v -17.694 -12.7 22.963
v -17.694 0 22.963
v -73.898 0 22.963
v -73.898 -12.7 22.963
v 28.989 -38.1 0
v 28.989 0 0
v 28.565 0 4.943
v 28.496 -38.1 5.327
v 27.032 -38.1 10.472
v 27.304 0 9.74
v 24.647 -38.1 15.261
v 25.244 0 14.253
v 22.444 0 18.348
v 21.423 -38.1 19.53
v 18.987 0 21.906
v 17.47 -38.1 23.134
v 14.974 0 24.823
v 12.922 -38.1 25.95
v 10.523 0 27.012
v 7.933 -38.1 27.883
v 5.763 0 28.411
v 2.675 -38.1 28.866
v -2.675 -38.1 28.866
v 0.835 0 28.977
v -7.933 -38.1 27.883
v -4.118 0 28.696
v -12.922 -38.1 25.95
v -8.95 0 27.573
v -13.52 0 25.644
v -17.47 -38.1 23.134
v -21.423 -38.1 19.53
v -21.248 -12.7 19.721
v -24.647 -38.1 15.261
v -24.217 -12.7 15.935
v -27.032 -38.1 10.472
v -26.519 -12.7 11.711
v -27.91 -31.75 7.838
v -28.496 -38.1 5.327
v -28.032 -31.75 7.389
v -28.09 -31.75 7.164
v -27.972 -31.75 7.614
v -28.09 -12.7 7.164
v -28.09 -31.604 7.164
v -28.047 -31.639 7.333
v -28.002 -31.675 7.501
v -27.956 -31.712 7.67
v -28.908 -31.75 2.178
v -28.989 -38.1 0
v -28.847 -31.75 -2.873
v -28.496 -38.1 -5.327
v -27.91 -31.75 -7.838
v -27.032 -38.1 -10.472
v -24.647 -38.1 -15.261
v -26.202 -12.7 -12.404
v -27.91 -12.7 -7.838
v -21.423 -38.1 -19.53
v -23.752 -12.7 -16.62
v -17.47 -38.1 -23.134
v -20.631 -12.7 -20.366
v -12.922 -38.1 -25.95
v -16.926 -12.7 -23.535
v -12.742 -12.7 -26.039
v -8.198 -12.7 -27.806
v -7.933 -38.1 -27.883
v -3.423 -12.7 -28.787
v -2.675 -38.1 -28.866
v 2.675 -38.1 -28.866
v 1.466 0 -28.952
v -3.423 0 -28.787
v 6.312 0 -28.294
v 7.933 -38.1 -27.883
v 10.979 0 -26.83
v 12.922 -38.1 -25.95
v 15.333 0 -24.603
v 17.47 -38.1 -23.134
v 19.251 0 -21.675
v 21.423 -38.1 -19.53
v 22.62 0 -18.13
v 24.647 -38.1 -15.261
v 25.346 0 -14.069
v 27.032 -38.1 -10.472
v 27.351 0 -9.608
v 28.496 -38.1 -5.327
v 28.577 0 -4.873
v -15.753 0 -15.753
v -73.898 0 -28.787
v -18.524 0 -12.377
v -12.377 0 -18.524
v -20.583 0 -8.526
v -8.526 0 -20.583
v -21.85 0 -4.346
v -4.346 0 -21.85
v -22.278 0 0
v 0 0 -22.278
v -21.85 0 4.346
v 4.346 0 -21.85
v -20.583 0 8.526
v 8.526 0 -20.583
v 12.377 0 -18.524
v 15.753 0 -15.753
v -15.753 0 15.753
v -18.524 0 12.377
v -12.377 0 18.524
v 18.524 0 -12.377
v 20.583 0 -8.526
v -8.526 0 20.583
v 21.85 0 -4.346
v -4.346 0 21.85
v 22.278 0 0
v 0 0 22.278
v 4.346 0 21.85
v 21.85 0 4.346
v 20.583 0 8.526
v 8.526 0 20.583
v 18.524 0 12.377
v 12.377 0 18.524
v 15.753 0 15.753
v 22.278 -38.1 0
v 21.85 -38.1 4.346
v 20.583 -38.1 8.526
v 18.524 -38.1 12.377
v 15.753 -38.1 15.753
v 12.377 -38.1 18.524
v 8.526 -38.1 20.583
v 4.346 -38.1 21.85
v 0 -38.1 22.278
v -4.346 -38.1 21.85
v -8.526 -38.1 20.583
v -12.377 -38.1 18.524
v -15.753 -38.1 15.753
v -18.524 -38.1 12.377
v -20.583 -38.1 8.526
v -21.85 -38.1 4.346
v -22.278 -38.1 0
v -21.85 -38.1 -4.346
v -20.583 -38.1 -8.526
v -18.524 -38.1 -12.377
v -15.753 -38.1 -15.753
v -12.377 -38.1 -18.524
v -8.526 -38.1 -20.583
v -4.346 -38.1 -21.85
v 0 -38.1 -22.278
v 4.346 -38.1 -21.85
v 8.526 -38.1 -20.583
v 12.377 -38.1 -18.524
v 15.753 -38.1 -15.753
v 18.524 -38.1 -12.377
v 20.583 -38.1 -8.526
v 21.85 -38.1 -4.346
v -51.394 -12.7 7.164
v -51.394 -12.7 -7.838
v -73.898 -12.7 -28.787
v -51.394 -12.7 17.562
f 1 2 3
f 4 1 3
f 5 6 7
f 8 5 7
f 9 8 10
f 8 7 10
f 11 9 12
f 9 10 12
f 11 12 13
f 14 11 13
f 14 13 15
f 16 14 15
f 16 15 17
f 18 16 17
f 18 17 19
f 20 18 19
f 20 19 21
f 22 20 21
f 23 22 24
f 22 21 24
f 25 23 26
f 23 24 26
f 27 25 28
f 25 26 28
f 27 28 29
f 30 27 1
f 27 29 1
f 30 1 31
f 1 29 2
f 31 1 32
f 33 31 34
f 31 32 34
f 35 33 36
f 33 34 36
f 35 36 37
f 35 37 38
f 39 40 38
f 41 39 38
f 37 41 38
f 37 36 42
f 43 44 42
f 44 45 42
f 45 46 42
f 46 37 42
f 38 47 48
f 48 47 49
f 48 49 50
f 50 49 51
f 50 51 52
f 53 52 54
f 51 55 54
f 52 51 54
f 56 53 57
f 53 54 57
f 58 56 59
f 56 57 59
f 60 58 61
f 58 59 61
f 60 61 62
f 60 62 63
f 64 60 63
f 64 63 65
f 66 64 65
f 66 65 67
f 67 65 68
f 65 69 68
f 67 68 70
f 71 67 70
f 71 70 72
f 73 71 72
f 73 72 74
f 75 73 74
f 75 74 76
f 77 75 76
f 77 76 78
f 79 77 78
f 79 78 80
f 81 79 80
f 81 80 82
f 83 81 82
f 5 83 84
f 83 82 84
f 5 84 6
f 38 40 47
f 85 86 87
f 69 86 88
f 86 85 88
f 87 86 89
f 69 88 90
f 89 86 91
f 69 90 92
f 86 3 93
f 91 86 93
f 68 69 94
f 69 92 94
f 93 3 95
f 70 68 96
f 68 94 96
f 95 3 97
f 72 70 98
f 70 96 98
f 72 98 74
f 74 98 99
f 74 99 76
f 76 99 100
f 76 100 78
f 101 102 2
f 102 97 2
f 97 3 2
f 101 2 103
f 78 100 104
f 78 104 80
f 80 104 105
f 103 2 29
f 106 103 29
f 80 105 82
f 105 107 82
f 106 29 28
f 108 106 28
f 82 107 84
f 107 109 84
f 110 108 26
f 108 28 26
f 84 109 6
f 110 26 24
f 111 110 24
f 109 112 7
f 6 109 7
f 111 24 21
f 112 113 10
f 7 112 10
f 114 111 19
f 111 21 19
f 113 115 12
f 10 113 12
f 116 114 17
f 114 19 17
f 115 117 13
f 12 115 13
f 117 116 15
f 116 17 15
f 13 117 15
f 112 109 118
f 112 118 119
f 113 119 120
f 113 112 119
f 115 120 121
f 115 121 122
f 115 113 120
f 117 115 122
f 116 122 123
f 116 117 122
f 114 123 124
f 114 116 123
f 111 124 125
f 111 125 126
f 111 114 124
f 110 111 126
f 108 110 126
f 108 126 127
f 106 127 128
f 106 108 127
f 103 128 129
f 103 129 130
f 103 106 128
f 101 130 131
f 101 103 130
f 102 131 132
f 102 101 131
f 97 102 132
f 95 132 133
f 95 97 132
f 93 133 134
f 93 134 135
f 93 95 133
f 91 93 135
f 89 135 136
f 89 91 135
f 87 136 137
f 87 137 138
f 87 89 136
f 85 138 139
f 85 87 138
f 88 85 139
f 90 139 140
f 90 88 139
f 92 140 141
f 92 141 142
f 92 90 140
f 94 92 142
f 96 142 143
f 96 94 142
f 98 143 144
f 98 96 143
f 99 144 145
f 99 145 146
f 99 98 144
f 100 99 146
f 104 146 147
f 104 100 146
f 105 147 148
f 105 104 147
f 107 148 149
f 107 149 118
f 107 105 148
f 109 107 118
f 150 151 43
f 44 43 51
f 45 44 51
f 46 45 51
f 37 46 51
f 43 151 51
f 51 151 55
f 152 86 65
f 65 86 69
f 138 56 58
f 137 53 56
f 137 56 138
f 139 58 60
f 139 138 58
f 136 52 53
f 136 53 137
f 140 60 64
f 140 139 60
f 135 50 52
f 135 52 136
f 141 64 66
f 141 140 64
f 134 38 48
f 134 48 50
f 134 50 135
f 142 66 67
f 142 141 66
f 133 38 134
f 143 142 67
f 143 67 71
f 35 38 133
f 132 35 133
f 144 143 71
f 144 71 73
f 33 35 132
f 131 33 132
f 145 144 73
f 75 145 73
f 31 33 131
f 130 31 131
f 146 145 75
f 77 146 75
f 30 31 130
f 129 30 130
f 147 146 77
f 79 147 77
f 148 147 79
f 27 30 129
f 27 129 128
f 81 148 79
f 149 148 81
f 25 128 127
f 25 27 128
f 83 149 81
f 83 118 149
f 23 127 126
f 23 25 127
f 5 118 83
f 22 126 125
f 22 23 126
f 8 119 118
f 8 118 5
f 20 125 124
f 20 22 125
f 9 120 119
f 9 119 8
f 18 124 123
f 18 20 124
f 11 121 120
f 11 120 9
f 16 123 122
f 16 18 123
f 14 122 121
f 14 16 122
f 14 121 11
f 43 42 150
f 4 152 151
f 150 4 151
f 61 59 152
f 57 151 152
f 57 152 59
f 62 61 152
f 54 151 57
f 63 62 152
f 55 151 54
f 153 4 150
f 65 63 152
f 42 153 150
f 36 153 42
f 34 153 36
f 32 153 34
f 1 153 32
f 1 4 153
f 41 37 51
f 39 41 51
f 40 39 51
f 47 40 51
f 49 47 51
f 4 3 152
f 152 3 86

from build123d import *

# Parameters (mm, degrees)
F0_R     = 22.27847408
F1_DEPTH = 38.1
F2_DEPTH = 12.7
F4_DEPTH = 19.05
F6_DEPTH = 25.4


with BuildPart() as f1:
    # F0 (on Front) → F1 (new body)
    with BuildSketch(Plane.XZ):
        with BuildLine():
            ThreePointArc((-3.4225089728, -28.7867356092), (19.2506230187, -21.674944708), (28.9894759301, 0))
            ThreePointArc((28.9894759301, 0), (12.795496455, 26.012785033), (-17.6940161623, 22.9632642878))
            ThreePointArc((-17.6940161623, 22.9632642878), (-27.9462435898, -7.7069568522), (-3.4225089728, -28.7867356092))
        make_face()
        Circle(F0_R, mode=Mode.SUBTRACT)
    extrude(amount=F1_DEPTH)

    # F0 (on Front) → F2 (join)
    with BuildSketch(Plane.XZ):
        with BuildLine():
            ThreePointArc((-3.4225089728, -28.7867356092), (-27.9462435898, -7.7069568522), (-17.6940161623, 22.9632642878))
            Line((-17.6940161623, 22.9632642878), (-73.8979172606, 22.9632642878))
            Line((-73.8979172606, 22.9632642878), (-73.8979172606, -28.7867356092))
            Line((-73.8979172606, -28.7867356092), (-3.4225089728, -28.7867356092))
        make_face()
    extrude(amount=F2_DEPTH)

    # F3 (on face) → F4 (join)
    with BuildSketch(Plane.XZ.offset(12.7)):
        with BuildLine():
            ThreePointArc((-27.9098332278, -7.8377882019), (-28.9873761892, -0.3489073921), (-28.0903995533, 7.1637397799))
            Line((-28.0903995533, 7.1637397799), (-51.3939457674, 7.1637397799))
            Line((-51.3939457674, 7.1637397799), (-51.3939457674, -7.8377882019))
            Line((-51.3939457674, -7.8377882019), (-27.9098332278, -7.8377882019))
        make_face()
    extrude(amount=F4_DEPTH)

    # F5 (on face) → F6 (cut)
    with BuildSketch(Plane(origin=(0, 0, -7.8377882019), x_dir=(1, 0, 0), z_dir=(0, 0, -1))):
        Polygon((-51.3939457674, 31.75), (-51.3939457674, 12.7), (-27.9098332278, 31.75), align=None)
    extrude(amount=-F6_DEPTH, mode=Mode.SUBTRACT)


solid = f1.part
